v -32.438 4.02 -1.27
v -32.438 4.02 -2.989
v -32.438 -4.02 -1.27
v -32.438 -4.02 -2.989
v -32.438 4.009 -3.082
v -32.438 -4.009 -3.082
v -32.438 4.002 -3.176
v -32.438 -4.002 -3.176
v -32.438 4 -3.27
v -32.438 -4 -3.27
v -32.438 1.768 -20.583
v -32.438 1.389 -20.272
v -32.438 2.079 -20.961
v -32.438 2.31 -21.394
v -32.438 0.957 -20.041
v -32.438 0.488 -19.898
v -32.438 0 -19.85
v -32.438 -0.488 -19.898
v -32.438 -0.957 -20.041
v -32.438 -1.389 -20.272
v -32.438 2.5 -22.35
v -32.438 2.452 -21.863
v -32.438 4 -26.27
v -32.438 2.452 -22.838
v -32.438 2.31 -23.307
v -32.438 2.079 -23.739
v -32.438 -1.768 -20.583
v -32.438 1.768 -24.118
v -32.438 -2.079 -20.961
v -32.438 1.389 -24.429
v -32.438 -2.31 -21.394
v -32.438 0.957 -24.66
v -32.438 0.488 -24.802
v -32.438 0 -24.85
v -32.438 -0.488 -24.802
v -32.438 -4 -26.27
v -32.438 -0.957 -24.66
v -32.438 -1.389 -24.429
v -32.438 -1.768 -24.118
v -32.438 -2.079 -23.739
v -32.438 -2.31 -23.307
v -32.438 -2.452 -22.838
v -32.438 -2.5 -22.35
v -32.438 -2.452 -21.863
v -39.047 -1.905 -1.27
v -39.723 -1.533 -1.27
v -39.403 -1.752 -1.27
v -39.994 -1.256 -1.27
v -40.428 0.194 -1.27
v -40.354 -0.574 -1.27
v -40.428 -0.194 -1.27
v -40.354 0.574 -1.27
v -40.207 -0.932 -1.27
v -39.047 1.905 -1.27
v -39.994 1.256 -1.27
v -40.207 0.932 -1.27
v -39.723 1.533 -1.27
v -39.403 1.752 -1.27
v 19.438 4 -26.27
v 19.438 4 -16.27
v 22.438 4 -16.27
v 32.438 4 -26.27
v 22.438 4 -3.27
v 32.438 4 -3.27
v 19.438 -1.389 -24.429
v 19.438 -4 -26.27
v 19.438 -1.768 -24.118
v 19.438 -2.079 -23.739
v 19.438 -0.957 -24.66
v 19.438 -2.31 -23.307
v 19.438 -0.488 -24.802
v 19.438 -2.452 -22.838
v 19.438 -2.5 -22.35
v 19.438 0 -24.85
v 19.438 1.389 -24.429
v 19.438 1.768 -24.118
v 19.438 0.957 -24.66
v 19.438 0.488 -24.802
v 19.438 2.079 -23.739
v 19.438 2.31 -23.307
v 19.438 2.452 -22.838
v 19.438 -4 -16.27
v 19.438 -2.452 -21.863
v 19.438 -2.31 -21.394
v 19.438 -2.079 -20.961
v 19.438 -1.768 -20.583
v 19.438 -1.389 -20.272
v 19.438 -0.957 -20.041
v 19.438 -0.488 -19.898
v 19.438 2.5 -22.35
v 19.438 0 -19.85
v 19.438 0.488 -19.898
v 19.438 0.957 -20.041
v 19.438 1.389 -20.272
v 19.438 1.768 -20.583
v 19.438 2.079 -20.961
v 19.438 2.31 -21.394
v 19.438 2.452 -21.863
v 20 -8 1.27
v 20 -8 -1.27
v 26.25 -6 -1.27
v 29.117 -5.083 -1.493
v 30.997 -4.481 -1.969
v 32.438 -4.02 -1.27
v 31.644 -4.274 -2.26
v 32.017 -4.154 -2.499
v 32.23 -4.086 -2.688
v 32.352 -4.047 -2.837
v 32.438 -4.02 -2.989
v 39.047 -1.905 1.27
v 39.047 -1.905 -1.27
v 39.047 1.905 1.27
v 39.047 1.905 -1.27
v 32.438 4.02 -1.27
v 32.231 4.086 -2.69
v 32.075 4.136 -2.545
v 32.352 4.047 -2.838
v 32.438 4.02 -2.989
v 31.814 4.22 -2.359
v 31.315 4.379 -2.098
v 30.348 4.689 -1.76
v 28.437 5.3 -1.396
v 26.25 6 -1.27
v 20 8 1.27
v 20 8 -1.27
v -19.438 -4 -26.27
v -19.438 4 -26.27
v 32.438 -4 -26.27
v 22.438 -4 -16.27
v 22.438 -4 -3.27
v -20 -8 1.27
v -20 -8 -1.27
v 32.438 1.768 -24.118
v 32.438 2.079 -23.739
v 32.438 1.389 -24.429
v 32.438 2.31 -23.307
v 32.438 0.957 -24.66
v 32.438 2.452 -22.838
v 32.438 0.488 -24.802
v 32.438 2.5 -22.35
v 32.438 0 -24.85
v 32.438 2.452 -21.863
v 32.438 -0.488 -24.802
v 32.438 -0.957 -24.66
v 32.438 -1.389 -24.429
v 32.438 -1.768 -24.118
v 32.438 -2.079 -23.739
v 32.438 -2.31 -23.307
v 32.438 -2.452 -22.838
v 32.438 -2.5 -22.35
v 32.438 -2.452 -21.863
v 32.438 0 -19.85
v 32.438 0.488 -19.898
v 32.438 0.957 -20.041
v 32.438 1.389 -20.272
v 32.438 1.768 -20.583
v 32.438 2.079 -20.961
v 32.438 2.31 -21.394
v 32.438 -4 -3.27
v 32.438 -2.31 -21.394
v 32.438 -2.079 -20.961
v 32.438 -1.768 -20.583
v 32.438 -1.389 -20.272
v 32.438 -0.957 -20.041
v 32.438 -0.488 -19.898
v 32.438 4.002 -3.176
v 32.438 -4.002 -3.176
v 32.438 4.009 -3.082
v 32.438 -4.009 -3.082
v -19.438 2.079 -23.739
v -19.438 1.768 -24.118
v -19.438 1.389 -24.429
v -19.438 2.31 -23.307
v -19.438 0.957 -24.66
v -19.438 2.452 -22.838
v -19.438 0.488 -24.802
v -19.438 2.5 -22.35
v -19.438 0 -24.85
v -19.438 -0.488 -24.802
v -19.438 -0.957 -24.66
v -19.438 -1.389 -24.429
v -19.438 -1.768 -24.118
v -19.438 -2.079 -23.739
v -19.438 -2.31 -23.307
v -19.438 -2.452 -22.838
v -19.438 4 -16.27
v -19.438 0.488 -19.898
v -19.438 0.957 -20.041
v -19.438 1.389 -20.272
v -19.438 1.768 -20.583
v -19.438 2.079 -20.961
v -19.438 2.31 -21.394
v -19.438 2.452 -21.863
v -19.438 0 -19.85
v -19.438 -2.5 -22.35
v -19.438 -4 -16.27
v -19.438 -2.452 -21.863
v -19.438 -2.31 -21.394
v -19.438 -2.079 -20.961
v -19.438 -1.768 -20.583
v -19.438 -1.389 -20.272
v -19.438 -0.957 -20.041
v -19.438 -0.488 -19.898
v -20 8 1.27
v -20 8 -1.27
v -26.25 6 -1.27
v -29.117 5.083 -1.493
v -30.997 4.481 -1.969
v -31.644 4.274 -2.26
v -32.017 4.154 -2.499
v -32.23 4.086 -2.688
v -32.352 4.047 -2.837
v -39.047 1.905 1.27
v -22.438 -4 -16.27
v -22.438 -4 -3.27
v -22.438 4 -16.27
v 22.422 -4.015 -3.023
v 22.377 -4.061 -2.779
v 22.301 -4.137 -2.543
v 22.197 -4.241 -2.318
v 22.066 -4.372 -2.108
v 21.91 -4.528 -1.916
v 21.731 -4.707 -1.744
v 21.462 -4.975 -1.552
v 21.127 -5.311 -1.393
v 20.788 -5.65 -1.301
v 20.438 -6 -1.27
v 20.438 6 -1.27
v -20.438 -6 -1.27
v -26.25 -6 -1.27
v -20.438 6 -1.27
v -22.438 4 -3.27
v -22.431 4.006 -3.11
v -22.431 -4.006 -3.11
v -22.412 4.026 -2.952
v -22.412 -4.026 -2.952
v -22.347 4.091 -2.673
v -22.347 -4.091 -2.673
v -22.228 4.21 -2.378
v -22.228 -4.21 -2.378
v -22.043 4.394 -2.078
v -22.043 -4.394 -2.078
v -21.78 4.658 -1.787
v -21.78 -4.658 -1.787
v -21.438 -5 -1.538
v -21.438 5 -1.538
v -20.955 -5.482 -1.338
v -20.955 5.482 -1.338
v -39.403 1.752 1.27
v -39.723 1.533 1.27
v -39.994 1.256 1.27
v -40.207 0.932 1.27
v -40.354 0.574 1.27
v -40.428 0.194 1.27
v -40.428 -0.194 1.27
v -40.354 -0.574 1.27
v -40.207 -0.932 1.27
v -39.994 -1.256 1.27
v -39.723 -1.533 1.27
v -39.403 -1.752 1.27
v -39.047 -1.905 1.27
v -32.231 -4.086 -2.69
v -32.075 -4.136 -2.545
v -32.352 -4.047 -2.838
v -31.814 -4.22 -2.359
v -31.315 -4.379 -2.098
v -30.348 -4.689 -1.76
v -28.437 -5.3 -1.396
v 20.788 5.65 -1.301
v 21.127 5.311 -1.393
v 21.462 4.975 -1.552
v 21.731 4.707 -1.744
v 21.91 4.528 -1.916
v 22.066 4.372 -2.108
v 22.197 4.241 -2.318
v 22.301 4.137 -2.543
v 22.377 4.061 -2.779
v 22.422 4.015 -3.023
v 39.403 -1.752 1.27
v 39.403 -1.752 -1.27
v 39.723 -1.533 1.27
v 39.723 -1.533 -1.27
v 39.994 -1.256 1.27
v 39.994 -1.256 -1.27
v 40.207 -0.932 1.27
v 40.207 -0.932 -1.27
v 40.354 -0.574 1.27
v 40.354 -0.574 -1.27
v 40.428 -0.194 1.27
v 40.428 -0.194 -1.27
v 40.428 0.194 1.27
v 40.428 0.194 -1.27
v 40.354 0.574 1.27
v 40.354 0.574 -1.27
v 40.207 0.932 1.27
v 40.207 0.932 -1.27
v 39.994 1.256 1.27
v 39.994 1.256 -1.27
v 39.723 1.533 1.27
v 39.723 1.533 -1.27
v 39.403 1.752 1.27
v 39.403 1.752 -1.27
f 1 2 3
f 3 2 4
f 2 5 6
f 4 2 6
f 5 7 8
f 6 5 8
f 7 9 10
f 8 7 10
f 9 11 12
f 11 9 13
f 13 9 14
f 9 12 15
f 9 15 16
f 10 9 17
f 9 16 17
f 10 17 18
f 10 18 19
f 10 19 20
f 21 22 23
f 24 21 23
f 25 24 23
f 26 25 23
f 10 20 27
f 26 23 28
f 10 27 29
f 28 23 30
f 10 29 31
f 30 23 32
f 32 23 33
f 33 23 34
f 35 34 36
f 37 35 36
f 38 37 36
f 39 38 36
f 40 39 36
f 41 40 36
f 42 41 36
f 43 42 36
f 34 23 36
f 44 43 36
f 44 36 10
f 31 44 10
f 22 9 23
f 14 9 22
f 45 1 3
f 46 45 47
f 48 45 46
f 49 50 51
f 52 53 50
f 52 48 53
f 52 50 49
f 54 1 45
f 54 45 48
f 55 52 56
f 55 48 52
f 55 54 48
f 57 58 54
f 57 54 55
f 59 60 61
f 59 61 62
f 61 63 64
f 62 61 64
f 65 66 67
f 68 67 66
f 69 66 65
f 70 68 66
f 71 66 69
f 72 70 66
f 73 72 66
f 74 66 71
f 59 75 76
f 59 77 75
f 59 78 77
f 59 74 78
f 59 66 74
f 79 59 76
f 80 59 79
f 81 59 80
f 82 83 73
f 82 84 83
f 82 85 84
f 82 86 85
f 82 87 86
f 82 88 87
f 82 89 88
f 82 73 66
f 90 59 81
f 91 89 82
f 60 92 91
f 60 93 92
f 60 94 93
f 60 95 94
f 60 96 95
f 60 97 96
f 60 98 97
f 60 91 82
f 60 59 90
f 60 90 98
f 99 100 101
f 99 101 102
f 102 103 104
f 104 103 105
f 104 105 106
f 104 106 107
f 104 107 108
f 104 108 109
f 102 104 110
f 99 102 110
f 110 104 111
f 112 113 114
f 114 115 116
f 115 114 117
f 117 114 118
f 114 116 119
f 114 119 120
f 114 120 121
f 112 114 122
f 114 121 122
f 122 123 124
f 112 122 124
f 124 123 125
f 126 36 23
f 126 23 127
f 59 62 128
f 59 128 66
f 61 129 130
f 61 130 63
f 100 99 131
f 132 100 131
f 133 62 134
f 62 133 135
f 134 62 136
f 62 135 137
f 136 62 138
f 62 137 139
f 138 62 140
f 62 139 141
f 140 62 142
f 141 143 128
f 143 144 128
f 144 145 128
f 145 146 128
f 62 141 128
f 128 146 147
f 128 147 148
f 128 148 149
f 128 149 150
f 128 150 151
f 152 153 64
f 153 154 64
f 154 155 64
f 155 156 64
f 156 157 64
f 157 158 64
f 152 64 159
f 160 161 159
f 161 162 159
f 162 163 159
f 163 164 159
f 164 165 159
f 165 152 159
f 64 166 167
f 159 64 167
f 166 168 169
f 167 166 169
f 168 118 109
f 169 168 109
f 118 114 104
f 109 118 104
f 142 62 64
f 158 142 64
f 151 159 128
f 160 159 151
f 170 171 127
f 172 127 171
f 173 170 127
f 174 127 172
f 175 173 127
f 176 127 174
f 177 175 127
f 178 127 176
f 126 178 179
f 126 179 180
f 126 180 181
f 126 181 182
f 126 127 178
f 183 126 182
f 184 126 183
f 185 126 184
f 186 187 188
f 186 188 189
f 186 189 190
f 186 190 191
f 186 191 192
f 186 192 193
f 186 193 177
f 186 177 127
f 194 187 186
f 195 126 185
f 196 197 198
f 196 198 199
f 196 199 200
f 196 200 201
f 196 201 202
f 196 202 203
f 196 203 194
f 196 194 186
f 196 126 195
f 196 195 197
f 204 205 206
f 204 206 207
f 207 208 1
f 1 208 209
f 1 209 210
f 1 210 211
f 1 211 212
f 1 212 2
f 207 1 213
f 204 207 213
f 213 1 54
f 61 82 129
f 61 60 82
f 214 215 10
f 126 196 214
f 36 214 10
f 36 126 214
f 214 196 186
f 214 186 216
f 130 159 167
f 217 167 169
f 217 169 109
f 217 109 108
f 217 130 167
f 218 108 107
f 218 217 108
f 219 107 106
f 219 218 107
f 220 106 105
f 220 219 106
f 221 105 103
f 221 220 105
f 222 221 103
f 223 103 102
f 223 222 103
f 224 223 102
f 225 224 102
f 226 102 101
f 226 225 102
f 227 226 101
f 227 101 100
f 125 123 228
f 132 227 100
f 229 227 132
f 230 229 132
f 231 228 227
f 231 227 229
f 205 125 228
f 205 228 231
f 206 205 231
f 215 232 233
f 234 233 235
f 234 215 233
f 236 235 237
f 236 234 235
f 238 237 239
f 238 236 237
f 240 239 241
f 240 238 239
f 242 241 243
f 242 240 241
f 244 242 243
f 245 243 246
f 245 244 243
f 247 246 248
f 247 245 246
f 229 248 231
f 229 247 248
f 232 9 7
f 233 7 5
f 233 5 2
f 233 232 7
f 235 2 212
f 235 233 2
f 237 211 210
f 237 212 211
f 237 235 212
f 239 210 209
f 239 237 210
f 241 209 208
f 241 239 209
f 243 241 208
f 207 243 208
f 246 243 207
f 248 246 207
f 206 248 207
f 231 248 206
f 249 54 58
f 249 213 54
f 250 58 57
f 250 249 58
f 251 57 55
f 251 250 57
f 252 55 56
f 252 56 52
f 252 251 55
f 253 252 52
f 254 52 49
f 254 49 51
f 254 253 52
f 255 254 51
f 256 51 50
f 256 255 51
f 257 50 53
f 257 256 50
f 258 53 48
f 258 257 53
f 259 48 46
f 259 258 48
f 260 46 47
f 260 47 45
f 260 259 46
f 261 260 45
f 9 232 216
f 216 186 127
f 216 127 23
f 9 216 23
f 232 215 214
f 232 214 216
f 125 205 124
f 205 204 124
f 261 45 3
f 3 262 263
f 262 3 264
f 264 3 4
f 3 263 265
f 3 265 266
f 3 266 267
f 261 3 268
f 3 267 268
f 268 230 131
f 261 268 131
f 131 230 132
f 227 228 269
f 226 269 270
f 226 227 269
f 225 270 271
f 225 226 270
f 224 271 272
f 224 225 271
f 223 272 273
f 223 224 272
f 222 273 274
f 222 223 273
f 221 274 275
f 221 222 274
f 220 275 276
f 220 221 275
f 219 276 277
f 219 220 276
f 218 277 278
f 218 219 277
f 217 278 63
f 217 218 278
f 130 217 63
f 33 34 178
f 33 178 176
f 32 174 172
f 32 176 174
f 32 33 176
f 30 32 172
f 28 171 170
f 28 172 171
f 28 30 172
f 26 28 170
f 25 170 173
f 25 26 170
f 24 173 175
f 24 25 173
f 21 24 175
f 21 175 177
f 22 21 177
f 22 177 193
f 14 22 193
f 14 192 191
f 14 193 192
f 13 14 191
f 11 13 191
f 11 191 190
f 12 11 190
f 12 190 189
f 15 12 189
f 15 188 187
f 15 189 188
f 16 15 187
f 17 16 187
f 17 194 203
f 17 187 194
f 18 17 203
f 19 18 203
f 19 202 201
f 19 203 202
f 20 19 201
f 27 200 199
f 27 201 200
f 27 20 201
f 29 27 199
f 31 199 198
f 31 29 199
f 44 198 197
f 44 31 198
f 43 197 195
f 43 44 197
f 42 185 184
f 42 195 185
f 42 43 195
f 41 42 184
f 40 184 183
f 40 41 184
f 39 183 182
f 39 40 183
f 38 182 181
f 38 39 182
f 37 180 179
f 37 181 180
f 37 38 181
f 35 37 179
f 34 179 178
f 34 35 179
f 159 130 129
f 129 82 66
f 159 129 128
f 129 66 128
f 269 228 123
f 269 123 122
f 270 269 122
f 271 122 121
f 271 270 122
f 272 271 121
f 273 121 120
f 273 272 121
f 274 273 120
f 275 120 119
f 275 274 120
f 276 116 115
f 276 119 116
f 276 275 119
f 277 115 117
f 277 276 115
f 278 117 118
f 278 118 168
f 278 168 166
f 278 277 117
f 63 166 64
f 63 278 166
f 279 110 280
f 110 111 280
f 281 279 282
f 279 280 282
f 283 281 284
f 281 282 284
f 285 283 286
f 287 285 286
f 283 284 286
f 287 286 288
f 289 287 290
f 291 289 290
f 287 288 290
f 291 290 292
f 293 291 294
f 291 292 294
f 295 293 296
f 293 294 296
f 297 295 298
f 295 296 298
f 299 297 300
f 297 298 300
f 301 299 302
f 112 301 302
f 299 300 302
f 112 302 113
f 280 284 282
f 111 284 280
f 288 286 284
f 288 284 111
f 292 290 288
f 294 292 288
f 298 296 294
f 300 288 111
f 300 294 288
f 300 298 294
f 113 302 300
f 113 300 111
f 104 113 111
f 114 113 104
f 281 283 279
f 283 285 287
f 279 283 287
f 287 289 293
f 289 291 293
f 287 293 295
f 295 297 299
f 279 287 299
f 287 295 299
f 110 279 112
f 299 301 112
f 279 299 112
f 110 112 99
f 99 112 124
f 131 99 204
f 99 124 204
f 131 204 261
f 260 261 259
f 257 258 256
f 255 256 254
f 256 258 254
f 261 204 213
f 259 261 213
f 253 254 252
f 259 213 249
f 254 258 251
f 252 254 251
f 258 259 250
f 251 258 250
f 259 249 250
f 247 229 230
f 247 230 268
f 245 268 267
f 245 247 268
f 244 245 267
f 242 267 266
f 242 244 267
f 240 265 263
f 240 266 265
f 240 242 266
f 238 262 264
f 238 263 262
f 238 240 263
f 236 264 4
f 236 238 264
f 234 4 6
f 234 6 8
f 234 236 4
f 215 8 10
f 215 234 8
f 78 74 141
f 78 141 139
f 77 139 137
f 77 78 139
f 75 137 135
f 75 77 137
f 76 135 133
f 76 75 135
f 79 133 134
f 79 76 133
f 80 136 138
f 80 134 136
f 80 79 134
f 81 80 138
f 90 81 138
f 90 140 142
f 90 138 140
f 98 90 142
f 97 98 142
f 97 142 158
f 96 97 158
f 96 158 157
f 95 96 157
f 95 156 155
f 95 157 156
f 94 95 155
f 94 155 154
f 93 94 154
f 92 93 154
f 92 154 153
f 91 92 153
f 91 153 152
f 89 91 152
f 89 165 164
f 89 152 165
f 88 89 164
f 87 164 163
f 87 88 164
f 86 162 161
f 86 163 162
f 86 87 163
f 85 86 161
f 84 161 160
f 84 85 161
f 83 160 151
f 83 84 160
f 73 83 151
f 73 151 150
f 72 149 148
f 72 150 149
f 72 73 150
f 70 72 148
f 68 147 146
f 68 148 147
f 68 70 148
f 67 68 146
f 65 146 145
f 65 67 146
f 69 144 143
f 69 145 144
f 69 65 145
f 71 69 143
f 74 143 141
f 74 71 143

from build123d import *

# Parameters (mm, degrees)
BOSS_EXTRUDE1_DEPTH     = 1.27
FILLET1_R               = 2
BOSS_EXTRUDE2_DEPTH     = 4
CUT_EXTRUDE1_DEPTH      = 49.880756713
CUT_EXTRUDE1_DEPTH_BACK = 49.880756713
SKETCH3_R               = 2.5
FILLET2_R               = 2


with BuildPart() as part:
    # Sketch1 → Boss-Extrude1 (new, symmetric)
    with BuildSketch(Plane.XY):
        Polygon((-45, 0), (-20, 8), (20, 8), (45, 0), (20, -8), (-20, -8), align=None)
    extrude(amount=BOSS_EXTRUDE1_DEPTH, both=True)

    # Fillet1
    fillet1_edges = [part.edges().sort_by_distance(p)[0] for p in [
        (-45, 0, 0),
        (45, 0, 0),
    ]]
    fillet(fillet1_edges, radius=FILLET1_R)

    # Sketch2 → Boss-Extrude2 (add, symmetric)
    with BuildSketch(Plane(origin=(0, 0, 0), x_dir=(1, 0, 0), z_dir=(0, 1, 0))):
        Polygon((-32.437797626, 1.27), (-32.437797626, 26.27), (-19.437797626, 26.27), (-19.437797626, 16.27), (-22.437797626, 16.27), (-22.437797626, 1.27), align=None)
        Polygon((22.437797626, 16.27), (22.437797626, 1.27), (32.437797626, 1.27), (32.437797626, 26.27), (19.437797626, 26.27), (19.437797626, 16.27), align=None)
    extrude(amount=BOSS_EXTRUDE2_DEPTH, both=True)

    # Sketch3 → Cut-Extrude1 (cut, two sides: drawn at the far end of the back side and taken through both)
    with BuildSketch(Plane(origin=(0, 0, 0), x_dir=(0, 0, -1), z_dir=(1, 0, 0)).offset(-CUT_EXTRUDE1_DEPTH_BACK)):
        with Locations((22.350351111, 0)):
            Circle(SKETCH3_R)
    extrude(amount=CUT_EXTRUDE1_DEPTH + CUT_EXTRUDE1_DEPTH_BACK, mode=Mode.SUBTRACT)

    # Fillet2
    # the kernel refuses this fillet: 2 mm, written as the material it adds along each edge
    with BuildSketch(Plane(origin=(-22.437797626, -4, -1.27), x_dir=(0, -1, 0), z_dir=(-1, 0, 0))) as fillet2_piece_1_section:
        with BuildLine():
            CenterArc((FILLET2_R, -FILLET2_R), FILLET2_R, 90, 90)
            Line((0, -FILLET2_R), (0, 0))
            Line((0, 0), (FILLET2_R, 0))
        make_face()
    fillet2_piece_1 = extrude(amount=10, mode=Mode.PRIVATE)
    fillet2_piece_1 = split(fillet2_piece_1, bisect_by=Plane(origin=(-27.271019309, -5.673273821, -1.76186219), z_dir=(0.3047757271037839, 0.9524241471993241, 0)), keep=Keep.TOP, mode=Mode.PRIVATE)
    add(fillet2_piece_1)
    with BuildSketch(Plane(origin=(-22.437797626, -4, -1.27), x_dir=(1, 0, 0), z_dir=(0, 1, 0))) as fillet2_piece_2:
        with BuildLine():
            CenterArc((FILLET2_R, FILLET2_R), FILLET2_R, 180, 90)
            Line((0, FILLET2_R), (0, 0))
            Line((0, 0), (FILLET2_R, 0))
        make_face()
    extrude(amount=8)
    with BuildSketch(Plane(origin=(-22.437797626, 4, -1.27), x_dir=(0, 1, 0), z_dir=(-1, 0, 0))) as fillet2_piece_3_section:
        with BuildLine():
            CenterArc((FILLET2_R, FILLET2_R), FILLET2_R, 180, 90)
            Line((0, FILLET2_R), (0, 0))
            Line((0, 0), (FILLET2_R, 0))
        make_face()
    fillet2_piece_3 = extrude(amount=10, mode=Mode.PRIVATE)
    fillet2_piece_3 = split(fillet2_piece_3, bisect_by=Plane(origin=(-27.271019309, 5.673273821, -1.76186219), z_dir=(0.3047757271037837, -0.9524241471993242, 0)), keep=Keep.TOP, mode=Mode.PRIVATE)
    add(fillet2_piece_3)
    with BuildSketch(Plane(origin=(22.437797626, -4, -1.27), x_dir=(0, -1, 0), z_dir=(1, 0, 0))) as fillet2_piece_4_section:
        with BuildLine():
            CenterArc((FILLET2_R, FILLET2_R), FILLET2_R, 180, 90)
            Line((0, FILLET2_R), (0, 0))
            Line((0, 0), (FILLET2_R, 0))
        make_face()
    fillet2_piece_4 = extrude(amount=10, mode=Mode.PRIVATE)
    fillet2_piece_4 = split(fillet2_piece_4, bisect_by=Plane(origin=(27.271019309, -5.673273821, -1.76186219), z_dir=(-0.30477572710378414, 0.9524241471993241, 0)), keep=Keep.TOP, mode=Mode.PRIVATE)
    add(fillet2_piece_4)
    with BuildSketch(Plane(origin=(22.437797626, -4, -1.27), x_dir=(-1, 0, 0), z_dir=(0, 1, 0))) as fillet2_piece_5:
        with BuildLine():
            CenterArc((FILLET2_R, -FILLET2_R), FILLET2_R, 90, 90)
            Line((0, -FILLET2_R), (0, 0))
            Line((0, 0), (FILLET2_R, 0))
        make_face()
    extrude(amount=8)
    with BuildSketch(Plane(origin=(22.437797626, 4, -1.27), x_dir=(0, 1, 0), z_dir=(1, 0, 0))) as fillet2_piece_6_section:
        with BuildLine():
            CenterArc((FILLET2_R, -FILLET2_R), FILLET2_R, 90, 90)
            Line((0, -FILLET2_R), (0, 0))
            Line((0, 0), (FILLET2_R, 0))
        make_face()
    fillet2_piece_6 = extrude(amount=10, mode=Mode.PRIVATE)
    fillet2_piece_6 = split(fillet2_piece_6, bisect_by=Plane(origin=(27.271019309, 5.673273821, -1.76186219), z_dir=(-0.30477572710378353, -0.9524241471993244, 0)), keep=Keep.TOP, mode=Mode.PRIVATE)
    add(fillet2_piece_6)
    with BuildSketch(Plane(origin=(-22.437797626, -9, -1.27), x_dir=(1, 0, 0), z_dir=(0, 1, 0))) as fillet2_piece_7a_section:
        with BuildLine():
            CenterArc((FILLET2_R, FILLET2_R), FILLET2_R, 180, 90)
            Line((0, FILLET2_R), (0, 0))
            Line((0, 0), (FILLET2_R, 0))
        make_face()
    fillet2_piece_7a = extrude(amount=13, mode=Mode.PRIVATE)
    fillet2_piece_7a = split(fillet2_piece_7a, bisect_by=Plane(origin=(-22.456507994, -7.213917442, -1.712345443), z_dir=(0.3047757271037839, 0.9524241471993241, 0)), keep=Keep.TOP, mode=Mode.PRIVATE)
    fillet2_piece_7a = split(fillet2_piece_7a, bisect_by=Plane(origin=(-21.967327257, -4, -1.712345443), z_dir=(0, -1, 0)), keep=Keep.TOP, mode=Mode.PRIVATE)
    with BuildSketch(Plane(origin=(-17.437797626, -4, -1.27), x_dir=(0, -1, 0), z_dir=(-1, 0, 0))) as fillet2_piece_7b_section:
        with BuildLine():
            CenterArc((FILLET2_R, -FILLET2_R), FILLET2_R, 90, 90)
            Line((0, -FILLET2_R), (0, 0))
            Line((0, 0), (FILLET2_R, 0))
        make_face()
    fillet2_piece_7b = extrude(amount=15, mode=Mode.PRIVATE)
    fillet2_piece_7b = split(fillet2_piece_7b, bisect_by=Plane(origin=(-22.437797626, -4.452790229, -1.722790229), z_dir=(1, 0, 0)), keep=Keep.TOP, mode=Mode.PRIVATE)
    fillet2_piece_7 = fillet2_piece_7a & fillet2_piece_7b
    add(fillet2_piece_7)
    with BuildSketch(Plane(origin=(-17.437797626, 4, -1.27), x_dir=(0, 1, 0), z_dir=(-1, 0, 0))) as fillet2_piece_8a_section:
        with BuildLine():
            CenterArc((FILLET2_R, FILLET2_R), FILLET2_R, 180, 90)
            Line((0, FILLET2_R), (0, 0))
            Line((0, 0), (FILLET2_R, 0))
        make_face()
    fillet2_piece_8a = extrude(amount=15, mode=Mode.PRIVATE)
    fillet2_piece_8a = split(fillet2_piece_8a, bisect_by=Plane(origin=(-22.437797626, 4.452790229, -1.722790229), z_dir=(1, 0, 0)), keep=Keep.TOP, mode=Mode.PRIVATE)
    with BuildSketch(Plane(origin=(-22.437797626, -4, -1.27), x_dir=(1, 0, 0), z_dir=(0, 1, 0))) as fillet2_piece_8b_section:
        with BuildLine():
            CenterArc((FILLET2_R, FILLET2_R), FILLET2_R, 180, 90)
            Line((0, FILLET2_R), (0, 0))
            Line((0, 0), (FILLET2_R, 0))
        make_face()
    fillet2_piece_8b = extrude(amount=13, mode=Mode.PRIVATE)
    fillet2_piece_8b = split(fillet2_piece_8b, bisect_by=Plane(origin=(-22.456507994, 7.213917442, -1.712345443), z_dir=(0.3047757271037837, -0.9524241471993242, 0)), keep=Keep.TOP, mode=Mode.PRIVATE)
    fillet2_piece_8b = split(fillet2_piece_8b, bisect_by=Plane(origin=(-21.967327257, 4, -1.712345443), z_dir=(0, 1, 0)), keep=Keep.TOP, mode=Mode.PRIVATE)
    fillet2_piece_8 = fillet2_piece_8a & fillet2_piece_8b
    add(fillet2_piece_8)
    with BuildSketch(Plane(origin=(22.437797626, -9, -1.27), x_dir=(-1, 0, 0), z_dir=(0, 1, 0))) as fillet2_piece_9a_section:
        with BuildLine():
            CenterArc((FILLET2_R, -FILLET2_R), FILLET2_R, 90, 90)
            Line((0, -FILLET2_R), (0, 0))
            Line((0, 0), (FILLET2_R, 0))
        make_face()
    fillet2_piece_9a = extrude(amount=13, mode=Mode.PRIVATE)
    fillet2_piece_9a = split(fillet2_piece_9a, bisect_by=Plane(origin=(22.456507994, -7.213917442, -1.712345443), z_dir=(-0.30477572710378414, 0.9524241471993241, 0)), keep=Keep.TOP, mode=Mode.PRIVATE)
    fillet2_piece_9a = split(fillet2_piece_9a, bisect_by=Plane(origin=(21.967327257, -4, -1.712345443), z_dir=(0, -1, 0)), keep=Keep.TOP, mode=Mode.PRIVATE)
    with BuildSketch(Plane(origin=(17.437797626, -4, -1.27), x_dir=(0, -1, 0), z_dir=(1, 0, 0))) as fillet2_piece_9b_section:
        with BuildLine():
            CenterArc((FILLET2_R, FILLET2_R), FILLET2_R, 180, 90)
            Line((0, FILLET2_R), (0, 0))
            Line((0, 0), (FILLET2_R, 0))
        make_face()
    fillet2_piece_9b = extrude(amount=15, mode=Mode.PRIVATE)
    fillet2_piece_9b = split(fillet2_piece_9b, bisect_by=Plane(origin=(22.437797626, -4.452790229, -1.722790229), z_dir=(-1, 0, 0)), keep=Keep.TOP, mode=Mode.PRIVATE)
    fillet2_piece_9 = fillet2_piece_9a & fillet2_piece_9b
    add(fillet2_piece_9)
    with BuildSketch(Plane(origin=(22.437797626, -4, -1.27), x_dir=(-1, 0, 0), z_dir=(0, 1, 0))) as fillet2_piece_10a_section:
        with BuildLine():
            CenterArc((FILLET2_R, -FILLET2_R), FILLET2_R, 90, 90)
            Line((0, -FILLET2_R), (0, 0))
            Line((0, 0), (FILLET2_R, 0))
        make_face()
    fillet2_piece_10a = extrude(amount=13, mode=Mode.PRIVATE)
    fillet2_piece_10a = split(fillet2_piece_10a, bisect_by=Plane(origin=(22.456507994, 7.213917442, -1.712345443), z_dir=(-0.30477572710378353, -0.9524241471993244, 0)), keep=Keep.TOP, mode=Mode.PRIVATE)
    fillet2_piece_10a = split(fillet2_piece_10a, bisect_by=Plane(origin=(21.967327257, 4, -1.712345443), z_dir=(0, 1, 0)), keep=Keep.TOP, mode=Mode.PRIVATE)
    with BuildSketch(Plane(origin=(17.437797626, 4, -1.27), x_dir=(0, 1, 0), z_dir=(1, 0, 0))) as fillet2_piece_10b_section:
        with BuildLine():
            CenterArc((FILLET2_R, -FILLET2_R), FILLET2_R, 90, 90)
            Line((0, -FILLET2_R), (0, 0))
            Line((0, 0), (FILLET2_R, 0))
        make_face()
    fillet2_piece_10b = extrude(amount=15, mode=Mode.PRIVATE)
    fillet2_piece_10b = split(fillet2_piece_10b, bisect_by=Plane(origin=(22.437797626, 4.452790229, -1.722790229), z_dir=(-1, 0, 0)), keep=Keep.TOP, mode=Mode.PRIVATE)
    fillet2_piece_10 = fillet2_piece_10a & fillet2_piece_10b
    add(fillet2_piece_10)


solid = part.part
